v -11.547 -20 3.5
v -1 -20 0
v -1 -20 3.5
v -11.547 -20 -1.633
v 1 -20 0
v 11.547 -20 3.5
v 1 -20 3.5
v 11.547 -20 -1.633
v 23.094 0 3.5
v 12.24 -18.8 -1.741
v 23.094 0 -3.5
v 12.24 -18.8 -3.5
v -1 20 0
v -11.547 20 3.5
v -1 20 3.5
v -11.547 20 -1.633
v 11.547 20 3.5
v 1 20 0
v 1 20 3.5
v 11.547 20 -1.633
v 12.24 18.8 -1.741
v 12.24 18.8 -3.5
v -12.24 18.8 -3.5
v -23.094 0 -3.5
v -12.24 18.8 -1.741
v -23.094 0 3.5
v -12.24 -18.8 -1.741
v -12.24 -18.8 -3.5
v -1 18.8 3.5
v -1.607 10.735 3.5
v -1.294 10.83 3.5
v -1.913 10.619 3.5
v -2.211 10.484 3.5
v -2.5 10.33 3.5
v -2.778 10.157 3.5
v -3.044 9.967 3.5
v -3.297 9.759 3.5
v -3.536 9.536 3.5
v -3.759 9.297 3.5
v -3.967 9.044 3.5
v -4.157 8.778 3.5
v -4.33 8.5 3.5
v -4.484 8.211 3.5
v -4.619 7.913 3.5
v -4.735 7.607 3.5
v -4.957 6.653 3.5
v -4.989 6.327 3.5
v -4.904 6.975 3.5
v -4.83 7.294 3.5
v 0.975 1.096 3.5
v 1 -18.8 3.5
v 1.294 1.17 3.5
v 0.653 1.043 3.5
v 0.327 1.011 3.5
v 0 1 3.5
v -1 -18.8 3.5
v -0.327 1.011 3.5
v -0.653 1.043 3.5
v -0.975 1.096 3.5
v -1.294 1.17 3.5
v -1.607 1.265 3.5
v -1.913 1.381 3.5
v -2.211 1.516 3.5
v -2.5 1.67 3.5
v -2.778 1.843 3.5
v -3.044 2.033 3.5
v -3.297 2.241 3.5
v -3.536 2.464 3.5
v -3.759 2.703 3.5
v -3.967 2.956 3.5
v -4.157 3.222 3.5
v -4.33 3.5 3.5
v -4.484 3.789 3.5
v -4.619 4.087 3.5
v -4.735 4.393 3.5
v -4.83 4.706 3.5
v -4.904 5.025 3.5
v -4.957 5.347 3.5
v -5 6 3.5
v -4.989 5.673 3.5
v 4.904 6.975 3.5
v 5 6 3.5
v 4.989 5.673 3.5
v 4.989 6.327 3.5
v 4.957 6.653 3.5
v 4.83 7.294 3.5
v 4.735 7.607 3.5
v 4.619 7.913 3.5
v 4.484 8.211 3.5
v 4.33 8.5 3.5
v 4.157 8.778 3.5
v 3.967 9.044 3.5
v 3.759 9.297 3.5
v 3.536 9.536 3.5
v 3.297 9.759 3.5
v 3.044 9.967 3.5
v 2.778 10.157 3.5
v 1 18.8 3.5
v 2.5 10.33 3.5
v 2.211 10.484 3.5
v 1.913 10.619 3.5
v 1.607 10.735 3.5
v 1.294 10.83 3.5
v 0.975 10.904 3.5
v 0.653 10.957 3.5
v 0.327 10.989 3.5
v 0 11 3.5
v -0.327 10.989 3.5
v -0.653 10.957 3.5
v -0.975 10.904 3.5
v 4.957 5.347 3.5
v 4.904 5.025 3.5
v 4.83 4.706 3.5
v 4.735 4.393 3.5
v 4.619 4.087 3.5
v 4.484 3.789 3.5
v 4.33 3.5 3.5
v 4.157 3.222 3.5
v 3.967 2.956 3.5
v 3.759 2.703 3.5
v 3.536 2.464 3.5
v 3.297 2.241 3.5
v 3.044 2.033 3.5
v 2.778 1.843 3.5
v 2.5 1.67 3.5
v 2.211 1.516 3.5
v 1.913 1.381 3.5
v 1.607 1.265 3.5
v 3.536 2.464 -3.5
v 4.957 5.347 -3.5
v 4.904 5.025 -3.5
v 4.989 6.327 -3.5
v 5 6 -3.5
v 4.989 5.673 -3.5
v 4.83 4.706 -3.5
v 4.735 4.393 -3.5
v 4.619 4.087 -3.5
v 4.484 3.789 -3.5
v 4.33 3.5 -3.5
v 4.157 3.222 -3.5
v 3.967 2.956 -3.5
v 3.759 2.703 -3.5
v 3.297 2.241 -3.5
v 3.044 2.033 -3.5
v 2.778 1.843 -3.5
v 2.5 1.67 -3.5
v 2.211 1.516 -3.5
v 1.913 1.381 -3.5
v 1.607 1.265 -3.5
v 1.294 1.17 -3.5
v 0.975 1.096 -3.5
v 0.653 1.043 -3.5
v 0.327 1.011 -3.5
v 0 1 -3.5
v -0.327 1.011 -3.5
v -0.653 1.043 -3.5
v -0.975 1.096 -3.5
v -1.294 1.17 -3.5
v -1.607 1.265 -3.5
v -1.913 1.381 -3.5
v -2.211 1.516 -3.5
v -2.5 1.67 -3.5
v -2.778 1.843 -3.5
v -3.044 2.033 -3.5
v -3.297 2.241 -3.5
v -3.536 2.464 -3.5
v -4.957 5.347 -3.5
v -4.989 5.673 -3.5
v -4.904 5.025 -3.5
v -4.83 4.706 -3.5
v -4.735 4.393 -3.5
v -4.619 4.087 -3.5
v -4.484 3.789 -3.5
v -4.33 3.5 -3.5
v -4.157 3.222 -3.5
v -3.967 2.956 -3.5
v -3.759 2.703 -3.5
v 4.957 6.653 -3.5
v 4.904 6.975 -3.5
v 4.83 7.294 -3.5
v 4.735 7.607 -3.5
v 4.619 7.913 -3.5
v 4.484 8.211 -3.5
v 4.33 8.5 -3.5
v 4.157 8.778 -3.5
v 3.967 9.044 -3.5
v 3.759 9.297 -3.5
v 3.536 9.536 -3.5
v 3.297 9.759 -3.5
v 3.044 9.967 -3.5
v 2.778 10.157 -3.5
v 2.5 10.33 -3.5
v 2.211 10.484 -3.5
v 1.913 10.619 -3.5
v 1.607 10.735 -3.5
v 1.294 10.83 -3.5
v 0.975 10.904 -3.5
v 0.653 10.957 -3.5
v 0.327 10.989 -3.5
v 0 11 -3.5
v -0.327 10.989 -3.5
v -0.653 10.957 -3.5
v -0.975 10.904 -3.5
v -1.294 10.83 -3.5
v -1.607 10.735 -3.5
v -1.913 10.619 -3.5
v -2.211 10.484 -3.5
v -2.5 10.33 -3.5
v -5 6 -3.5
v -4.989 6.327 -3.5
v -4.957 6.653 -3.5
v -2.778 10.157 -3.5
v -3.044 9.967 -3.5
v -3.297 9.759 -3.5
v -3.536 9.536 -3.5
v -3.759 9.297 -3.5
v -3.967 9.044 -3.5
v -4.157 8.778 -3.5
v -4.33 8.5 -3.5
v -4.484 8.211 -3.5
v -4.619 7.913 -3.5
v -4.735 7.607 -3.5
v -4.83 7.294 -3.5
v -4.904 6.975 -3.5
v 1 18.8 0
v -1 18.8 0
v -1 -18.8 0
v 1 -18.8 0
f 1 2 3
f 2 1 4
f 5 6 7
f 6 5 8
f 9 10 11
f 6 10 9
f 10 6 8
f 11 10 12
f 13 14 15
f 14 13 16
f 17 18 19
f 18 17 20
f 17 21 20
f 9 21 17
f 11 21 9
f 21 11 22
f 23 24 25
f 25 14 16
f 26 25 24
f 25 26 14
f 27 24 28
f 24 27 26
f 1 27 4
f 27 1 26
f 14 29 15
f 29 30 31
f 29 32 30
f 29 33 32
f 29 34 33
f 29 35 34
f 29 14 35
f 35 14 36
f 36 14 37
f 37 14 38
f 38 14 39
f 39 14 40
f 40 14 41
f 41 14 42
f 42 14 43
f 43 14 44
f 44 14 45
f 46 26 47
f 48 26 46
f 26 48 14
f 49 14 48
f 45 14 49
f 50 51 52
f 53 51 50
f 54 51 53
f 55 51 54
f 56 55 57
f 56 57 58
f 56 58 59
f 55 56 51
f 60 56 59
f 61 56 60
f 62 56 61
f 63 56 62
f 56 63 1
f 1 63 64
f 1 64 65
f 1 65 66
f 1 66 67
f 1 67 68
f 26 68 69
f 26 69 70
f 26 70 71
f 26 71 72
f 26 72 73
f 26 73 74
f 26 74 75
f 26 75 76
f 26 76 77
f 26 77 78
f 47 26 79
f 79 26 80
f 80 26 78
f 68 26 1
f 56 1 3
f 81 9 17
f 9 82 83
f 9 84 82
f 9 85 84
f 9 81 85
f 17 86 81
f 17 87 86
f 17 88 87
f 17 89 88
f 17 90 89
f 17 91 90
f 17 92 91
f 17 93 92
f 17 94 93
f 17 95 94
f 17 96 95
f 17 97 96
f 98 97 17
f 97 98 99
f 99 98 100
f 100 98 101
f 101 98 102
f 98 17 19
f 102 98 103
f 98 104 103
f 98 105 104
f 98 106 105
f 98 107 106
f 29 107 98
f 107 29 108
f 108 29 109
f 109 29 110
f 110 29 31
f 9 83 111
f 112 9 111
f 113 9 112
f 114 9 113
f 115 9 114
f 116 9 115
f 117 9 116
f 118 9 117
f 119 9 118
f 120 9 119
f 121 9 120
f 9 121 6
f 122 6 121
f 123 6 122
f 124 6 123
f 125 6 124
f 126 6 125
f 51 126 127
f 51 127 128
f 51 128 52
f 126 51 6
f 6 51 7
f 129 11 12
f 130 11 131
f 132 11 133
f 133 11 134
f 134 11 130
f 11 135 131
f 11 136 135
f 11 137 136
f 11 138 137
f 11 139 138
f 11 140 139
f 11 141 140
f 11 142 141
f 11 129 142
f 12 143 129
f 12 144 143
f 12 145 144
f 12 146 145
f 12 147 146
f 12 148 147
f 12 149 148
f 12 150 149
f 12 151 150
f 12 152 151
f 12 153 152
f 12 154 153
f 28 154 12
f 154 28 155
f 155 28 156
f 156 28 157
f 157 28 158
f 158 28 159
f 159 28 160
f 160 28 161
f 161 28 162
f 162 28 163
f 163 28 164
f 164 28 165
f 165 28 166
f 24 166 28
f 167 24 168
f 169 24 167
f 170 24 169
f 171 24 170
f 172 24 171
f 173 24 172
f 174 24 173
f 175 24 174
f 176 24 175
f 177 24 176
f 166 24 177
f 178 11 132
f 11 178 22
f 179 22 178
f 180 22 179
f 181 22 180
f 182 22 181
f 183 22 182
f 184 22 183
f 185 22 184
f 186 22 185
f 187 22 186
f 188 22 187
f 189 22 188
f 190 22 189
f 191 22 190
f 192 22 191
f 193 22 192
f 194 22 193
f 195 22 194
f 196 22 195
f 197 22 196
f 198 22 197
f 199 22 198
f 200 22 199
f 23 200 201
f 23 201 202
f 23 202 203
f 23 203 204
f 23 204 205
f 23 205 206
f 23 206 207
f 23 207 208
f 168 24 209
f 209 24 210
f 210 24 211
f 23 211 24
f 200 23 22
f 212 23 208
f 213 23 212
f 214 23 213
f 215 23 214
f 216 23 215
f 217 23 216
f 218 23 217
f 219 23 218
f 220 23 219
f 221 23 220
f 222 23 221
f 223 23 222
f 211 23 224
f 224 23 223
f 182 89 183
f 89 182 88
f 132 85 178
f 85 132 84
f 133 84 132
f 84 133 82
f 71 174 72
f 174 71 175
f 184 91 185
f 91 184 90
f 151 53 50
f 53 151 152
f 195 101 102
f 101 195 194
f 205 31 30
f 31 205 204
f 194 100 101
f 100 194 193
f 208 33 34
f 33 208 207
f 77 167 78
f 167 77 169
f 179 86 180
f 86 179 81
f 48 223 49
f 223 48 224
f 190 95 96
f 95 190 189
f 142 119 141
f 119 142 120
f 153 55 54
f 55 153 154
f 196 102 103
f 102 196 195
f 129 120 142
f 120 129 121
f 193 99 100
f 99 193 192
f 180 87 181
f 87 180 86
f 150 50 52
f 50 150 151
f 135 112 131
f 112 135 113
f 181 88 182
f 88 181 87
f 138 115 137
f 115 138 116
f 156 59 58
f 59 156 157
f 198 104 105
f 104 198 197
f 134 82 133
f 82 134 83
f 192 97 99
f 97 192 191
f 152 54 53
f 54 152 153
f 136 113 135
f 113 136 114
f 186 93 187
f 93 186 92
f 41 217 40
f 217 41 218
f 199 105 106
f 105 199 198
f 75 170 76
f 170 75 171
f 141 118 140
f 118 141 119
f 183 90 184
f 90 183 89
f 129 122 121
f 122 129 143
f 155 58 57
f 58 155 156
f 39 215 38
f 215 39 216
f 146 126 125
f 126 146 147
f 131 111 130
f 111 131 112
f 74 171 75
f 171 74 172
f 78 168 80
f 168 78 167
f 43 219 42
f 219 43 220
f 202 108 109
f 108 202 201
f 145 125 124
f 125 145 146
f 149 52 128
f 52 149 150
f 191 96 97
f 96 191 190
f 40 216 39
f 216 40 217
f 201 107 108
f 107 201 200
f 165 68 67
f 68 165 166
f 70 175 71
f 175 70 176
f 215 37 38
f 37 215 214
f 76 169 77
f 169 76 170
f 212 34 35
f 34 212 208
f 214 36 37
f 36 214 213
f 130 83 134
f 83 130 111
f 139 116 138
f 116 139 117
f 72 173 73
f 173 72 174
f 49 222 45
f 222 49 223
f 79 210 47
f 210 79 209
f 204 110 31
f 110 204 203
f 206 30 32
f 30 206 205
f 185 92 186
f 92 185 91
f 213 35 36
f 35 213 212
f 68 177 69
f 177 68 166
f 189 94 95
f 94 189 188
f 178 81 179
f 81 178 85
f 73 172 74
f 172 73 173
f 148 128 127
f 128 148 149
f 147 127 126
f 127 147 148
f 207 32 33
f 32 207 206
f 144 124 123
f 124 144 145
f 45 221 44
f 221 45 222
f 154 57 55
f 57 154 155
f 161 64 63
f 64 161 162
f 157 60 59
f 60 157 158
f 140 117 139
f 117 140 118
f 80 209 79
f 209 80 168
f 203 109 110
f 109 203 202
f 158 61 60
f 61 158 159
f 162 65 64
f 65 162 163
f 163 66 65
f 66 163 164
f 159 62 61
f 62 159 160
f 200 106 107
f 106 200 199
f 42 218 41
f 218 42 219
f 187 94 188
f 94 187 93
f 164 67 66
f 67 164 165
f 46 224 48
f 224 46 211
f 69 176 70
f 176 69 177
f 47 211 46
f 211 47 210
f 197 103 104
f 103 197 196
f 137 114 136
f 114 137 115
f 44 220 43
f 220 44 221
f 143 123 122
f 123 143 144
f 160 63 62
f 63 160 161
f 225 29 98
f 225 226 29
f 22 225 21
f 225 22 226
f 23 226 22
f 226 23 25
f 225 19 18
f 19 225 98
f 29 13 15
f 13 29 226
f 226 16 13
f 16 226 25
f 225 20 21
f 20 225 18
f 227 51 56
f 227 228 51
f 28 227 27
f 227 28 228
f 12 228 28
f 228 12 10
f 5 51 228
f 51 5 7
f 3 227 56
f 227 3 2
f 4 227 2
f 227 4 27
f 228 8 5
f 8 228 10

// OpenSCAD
$fn=96;

bbox_x = 46.2;
bbox_y = 40.0;
th = 7.0;

hole_d = 10.0;
hole_offset = 6.0;

groove_depth = 1.2;
groove_width = 6.0;
land_width = 2.0;

module hex_prism_flat_to_flat(f2f, h){
    r = f2f / sqrt(3);
    cylinder(h=h, r=r, center=true, $fn=6);
}

module v_groove_cut(face_sign=1){
    // face_sign: +1 for +Y face, -1 for -Y face
    y_face = face_sign * (bbox_y/2);
    y_center = y_face - face_sign * (groove_depth/2);
    translate([0, y_center, 0])
        rotate([90,0,0])
            linear_extrude(height=groove_depth, center=true, convexity=10)
                polygon(points=[
                    [-bbox_x, -th],
                    [-land_width/2, 0],
                    [-land_width/2, groove_width],
                    [ land_width/2, groove_width],
                    [ land_width/2, 0],
                    [ bbox_x, -th]
                ]);
}

difference(){
    union(){
        hex_prism_flat_to_flat(bbox_y, th);
    }
    translate([0, hole_offset, 0])
        cylinder(h=th+2, d=hole_d, center=true, $fn=96);

    v_groove_cut(+1);
    v_groove_cut(-1);
}
